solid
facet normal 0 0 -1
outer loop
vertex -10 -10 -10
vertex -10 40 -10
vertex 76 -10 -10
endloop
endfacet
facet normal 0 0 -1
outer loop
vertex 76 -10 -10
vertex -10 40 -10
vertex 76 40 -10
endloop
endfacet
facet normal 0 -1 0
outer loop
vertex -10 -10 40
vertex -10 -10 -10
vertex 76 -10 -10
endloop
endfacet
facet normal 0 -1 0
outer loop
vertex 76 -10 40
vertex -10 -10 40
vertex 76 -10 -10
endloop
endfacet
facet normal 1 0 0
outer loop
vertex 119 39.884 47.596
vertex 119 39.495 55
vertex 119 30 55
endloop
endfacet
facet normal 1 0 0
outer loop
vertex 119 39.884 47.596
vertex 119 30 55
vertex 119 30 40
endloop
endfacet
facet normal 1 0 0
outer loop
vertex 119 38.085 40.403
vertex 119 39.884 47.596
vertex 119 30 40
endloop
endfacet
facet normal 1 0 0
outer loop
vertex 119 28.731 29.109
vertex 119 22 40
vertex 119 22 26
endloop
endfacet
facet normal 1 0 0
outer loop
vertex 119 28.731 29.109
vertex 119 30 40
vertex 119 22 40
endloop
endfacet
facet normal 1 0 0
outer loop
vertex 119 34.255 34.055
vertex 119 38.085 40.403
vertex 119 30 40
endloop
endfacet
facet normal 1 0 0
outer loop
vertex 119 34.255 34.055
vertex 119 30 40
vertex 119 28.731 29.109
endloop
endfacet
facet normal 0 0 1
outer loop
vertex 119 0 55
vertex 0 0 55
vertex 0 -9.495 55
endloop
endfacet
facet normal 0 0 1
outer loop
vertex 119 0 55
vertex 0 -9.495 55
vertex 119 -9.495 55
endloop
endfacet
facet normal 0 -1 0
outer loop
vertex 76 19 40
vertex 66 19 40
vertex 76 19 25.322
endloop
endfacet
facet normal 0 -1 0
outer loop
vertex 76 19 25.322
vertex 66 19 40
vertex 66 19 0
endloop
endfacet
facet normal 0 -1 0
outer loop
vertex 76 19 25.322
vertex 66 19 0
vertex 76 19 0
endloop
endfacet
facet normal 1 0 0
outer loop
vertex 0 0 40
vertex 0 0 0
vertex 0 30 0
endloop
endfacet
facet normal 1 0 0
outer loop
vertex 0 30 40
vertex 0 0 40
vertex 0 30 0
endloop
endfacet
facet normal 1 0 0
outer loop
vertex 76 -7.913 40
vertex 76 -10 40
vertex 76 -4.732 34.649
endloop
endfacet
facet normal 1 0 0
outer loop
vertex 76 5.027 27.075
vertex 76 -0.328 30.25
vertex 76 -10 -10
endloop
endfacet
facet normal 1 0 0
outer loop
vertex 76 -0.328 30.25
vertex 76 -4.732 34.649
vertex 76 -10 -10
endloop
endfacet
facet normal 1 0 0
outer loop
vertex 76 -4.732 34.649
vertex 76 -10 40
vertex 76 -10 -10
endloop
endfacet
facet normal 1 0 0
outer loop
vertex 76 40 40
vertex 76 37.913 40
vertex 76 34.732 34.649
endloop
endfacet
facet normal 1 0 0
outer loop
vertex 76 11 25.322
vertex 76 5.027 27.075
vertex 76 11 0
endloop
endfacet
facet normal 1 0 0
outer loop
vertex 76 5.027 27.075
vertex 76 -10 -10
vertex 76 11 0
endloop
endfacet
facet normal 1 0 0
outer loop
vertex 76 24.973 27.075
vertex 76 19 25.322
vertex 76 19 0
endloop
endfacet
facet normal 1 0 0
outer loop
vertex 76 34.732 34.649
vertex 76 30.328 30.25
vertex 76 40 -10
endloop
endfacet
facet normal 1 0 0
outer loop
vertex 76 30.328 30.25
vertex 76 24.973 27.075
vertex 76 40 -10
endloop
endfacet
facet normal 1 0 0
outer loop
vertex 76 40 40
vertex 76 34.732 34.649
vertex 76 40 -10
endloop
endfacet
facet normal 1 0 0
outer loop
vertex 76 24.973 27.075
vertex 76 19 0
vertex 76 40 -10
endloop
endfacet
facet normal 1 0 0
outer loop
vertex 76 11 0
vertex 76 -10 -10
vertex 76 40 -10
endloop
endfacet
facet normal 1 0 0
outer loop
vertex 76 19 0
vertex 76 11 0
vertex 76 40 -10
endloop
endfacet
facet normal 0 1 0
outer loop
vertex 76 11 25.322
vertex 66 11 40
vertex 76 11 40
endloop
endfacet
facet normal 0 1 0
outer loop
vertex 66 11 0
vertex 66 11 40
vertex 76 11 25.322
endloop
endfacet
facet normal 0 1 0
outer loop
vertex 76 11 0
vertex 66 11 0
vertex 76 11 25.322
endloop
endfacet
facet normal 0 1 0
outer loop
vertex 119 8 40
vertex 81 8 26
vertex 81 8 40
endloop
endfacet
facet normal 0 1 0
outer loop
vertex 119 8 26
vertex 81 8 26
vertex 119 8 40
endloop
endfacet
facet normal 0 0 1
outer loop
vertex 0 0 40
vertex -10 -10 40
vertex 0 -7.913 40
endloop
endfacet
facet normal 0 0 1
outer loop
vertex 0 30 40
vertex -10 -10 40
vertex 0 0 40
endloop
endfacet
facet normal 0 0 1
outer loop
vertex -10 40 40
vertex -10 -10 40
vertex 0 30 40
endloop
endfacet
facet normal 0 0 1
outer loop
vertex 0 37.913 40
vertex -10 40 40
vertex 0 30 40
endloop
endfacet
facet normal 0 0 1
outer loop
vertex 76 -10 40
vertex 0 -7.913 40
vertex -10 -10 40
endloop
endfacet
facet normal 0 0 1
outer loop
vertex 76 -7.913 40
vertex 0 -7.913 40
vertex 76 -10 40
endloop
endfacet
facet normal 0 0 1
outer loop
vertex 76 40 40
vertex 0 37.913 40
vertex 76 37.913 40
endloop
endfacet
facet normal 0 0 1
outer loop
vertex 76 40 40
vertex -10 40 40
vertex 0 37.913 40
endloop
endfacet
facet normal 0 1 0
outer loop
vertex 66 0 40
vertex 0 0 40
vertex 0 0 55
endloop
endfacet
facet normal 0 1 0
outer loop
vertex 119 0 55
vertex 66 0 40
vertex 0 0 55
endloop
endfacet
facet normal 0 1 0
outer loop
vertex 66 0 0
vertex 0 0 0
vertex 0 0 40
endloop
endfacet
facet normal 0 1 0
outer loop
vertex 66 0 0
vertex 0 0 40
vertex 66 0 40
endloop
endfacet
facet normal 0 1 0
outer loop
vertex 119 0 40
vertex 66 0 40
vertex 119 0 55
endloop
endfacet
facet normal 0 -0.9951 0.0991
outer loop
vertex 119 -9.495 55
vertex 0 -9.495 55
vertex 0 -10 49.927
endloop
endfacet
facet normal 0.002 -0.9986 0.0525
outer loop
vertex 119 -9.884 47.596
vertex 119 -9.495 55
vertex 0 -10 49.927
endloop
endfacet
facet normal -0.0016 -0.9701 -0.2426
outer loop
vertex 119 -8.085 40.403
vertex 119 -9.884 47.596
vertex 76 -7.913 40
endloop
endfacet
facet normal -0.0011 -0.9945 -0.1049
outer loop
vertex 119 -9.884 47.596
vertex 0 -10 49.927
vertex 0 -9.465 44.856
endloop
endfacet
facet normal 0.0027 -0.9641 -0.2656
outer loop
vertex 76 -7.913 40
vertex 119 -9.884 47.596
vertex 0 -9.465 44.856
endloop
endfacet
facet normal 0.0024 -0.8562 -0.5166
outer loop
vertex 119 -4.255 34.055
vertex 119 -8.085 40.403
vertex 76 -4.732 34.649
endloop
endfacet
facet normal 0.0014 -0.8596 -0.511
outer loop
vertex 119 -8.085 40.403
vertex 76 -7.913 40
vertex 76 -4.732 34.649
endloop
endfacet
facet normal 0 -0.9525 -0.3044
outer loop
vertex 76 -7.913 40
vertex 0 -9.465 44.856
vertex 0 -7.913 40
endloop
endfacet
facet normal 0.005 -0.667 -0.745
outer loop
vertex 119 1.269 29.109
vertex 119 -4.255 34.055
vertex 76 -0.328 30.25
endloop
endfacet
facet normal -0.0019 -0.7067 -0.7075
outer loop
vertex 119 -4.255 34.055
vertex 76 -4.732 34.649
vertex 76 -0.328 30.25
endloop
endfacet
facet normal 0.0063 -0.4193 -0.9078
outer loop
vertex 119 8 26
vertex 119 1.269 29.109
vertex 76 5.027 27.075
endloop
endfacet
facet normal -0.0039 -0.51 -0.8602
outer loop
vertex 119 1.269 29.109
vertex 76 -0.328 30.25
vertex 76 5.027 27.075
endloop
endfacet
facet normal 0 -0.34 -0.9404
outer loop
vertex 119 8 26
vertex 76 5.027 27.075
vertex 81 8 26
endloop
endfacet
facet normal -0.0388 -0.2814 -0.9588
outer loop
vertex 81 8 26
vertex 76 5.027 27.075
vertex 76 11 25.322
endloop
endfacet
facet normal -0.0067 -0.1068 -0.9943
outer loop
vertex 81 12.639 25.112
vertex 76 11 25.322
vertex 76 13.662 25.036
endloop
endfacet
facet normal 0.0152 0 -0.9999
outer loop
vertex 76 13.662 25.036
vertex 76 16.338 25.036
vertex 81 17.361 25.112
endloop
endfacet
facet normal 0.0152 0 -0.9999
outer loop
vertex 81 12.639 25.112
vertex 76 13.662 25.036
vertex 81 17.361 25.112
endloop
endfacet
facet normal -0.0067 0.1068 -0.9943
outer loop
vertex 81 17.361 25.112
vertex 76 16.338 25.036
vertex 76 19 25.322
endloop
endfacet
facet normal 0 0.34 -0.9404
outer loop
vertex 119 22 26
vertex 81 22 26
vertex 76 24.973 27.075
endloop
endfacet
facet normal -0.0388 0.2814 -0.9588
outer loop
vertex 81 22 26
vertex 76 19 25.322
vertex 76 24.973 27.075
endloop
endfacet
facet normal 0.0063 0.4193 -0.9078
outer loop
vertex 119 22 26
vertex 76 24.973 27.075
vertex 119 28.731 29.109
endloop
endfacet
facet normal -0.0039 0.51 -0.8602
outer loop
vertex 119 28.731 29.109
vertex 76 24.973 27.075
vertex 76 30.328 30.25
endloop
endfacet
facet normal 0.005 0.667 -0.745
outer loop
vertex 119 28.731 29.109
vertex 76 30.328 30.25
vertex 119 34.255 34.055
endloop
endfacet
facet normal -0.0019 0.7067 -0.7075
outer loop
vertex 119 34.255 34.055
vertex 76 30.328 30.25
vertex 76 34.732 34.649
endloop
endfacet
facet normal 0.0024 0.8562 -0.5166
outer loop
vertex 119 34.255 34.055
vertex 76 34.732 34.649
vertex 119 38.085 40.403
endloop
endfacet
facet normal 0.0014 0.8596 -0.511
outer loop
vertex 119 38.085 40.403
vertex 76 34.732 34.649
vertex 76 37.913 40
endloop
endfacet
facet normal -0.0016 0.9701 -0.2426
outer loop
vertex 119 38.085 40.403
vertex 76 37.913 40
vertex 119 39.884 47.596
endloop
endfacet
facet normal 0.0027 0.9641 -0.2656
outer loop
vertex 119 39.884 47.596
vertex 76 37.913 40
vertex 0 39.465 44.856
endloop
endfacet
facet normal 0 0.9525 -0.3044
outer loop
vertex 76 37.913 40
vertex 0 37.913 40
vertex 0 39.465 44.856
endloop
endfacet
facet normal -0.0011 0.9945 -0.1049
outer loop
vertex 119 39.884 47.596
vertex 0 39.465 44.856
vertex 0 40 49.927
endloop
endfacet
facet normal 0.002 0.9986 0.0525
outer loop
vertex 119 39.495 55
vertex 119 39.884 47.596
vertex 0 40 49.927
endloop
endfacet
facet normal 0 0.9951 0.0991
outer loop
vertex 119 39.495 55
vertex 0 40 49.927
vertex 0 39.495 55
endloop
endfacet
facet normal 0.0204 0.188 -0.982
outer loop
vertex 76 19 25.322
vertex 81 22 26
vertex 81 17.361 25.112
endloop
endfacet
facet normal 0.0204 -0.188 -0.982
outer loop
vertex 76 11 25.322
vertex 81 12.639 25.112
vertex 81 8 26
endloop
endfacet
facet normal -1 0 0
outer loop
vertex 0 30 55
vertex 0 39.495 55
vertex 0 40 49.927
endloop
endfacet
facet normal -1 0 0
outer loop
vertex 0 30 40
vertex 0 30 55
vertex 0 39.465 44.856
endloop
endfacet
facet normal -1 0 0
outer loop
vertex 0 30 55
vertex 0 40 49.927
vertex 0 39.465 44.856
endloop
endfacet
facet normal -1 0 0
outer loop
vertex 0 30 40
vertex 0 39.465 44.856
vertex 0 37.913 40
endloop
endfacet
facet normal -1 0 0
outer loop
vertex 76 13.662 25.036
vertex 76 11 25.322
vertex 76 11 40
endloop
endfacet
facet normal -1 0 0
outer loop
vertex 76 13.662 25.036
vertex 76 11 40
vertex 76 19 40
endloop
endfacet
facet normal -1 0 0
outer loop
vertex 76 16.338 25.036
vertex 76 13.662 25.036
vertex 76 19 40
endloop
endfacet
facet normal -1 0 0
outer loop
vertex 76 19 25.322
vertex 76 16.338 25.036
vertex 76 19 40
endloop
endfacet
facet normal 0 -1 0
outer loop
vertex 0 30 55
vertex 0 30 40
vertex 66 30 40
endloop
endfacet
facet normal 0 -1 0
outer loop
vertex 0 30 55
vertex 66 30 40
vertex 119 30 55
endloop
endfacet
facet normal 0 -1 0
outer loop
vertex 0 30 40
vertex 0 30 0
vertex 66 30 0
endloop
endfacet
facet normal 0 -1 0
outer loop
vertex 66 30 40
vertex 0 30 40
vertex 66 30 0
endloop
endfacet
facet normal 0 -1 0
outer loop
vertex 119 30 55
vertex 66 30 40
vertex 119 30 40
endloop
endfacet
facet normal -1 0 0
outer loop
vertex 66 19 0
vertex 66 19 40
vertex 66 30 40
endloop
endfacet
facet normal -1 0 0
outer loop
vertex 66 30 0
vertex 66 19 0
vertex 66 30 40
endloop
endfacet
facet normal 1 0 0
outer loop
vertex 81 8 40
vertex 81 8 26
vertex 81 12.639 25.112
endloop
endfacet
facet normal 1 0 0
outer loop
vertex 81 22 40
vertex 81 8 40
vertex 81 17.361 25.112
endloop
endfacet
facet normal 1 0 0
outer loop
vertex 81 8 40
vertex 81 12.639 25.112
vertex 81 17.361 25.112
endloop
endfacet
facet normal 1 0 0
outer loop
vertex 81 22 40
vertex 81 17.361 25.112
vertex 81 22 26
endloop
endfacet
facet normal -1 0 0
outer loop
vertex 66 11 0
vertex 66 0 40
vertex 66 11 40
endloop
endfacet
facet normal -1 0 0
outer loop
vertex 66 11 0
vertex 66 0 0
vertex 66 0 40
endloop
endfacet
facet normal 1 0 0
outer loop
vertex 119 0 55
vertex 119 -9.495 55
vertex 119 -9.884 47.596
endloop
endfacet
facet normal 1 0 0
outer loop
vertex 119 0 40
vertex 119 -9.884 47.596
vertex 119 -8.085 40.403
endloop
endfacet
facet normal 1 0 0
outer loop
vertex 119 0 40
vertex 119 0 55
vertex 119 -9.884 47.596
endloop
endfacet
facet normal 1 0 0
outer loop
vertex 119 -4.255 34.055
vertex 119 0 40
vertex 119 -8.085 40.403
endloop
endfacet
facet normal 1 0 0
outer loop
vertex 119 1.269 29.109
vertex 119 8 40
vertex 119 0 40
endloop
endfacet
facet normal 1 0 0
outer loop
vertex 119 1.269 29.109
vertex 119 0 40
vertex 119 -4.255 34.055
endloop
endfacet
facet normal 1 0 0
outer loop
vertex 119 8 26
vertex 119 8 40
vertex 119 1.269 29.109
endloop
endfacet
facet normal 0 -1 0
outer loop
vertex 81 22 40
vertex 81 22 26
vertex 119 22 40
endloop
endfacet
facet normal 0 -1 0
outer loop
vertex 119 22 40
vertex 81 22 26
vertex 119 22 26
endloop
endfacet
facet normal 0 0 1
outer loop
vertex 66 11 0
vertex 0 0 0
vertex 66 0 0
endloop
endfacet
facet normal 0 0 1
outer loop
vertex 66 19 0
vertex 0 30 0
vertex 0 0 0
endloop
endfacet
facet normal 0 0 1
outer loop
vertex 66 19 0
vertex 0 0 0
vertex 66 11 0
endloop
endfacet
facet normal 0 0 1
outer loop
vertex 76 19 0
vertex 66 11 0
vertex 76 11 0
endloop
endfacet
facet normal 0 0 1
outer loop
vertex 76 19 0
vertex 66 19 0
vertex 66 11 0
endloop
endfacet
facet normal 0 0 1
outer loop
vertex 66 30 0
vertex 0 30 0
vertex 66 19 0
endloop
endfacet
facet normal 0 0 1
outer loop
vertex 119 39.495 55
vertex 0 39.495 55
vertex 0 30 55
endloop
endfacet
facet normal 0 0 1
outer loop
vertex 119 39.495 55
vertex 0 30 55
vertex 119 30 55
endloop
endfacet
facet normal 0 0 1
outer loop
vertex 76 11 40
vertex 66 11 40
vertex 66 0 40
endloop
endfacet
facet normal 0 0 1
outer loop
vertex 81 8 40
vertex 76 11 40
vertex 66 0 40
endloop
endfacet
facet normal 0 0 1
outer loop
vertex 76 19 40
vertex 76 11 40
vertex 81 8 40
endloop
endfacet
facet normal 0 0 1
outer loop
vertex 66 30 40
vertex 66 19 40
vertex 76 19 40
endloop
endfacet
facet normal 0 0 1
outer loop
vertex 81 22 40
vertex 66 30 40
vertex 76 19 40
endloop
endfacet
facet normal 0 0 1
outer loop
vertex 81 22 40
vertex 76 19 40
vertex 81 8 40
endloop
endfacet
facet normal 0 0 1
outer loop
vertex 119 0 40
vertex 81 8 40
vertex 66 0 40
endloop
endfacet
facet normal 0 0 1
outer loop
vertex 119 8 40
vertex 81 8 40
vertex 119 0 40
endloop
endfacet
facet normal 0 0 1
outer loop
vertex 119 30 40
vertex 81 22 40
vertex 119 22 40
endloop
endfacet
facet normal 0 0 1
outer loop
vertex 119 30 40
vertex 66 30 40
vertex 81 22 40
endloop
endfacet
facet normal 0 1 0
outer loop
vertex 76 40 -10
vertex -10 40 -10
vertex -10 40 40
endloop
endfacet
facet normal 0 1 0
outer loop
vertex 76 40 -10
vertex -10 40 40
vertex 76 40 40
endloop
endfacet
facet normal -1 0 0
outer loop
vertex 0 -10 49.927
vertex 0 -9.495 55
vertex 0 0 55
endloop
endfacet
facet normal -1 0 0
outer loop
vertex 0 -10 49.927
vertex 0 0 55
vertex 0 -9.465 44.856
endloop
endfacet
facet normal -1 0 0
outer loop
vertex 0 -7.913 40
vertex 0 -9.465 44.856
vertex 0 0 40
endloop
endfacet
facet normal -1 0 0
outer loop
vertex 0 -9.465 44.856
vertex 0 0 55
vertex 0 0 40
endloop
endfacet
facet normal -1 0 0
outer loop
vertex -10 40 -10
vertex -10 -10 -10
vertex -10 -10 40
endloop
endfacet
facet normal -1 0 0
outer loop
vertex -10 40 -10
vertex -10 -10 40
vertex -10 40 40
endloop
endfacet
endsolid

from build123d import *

# Parameters (mm, degrees)
BOX051_W          = 10
BOX051_H          = 8
BOX051_DEPTH      = 40
BOX050_W          = 67
BOX050_H          = 14
BOX050_DEPTH      = 25
BOX049_W          = 67
BOX049_H          = 30
BOX049_DEPTH      = 15
BOX048_W          = 119
BOX048_H          = 70
BOX048_DEPTH      = 30
BOX046_W          = 66
BOX046_H          = 30
BOX046_DEPTH      = 60
CYLINDER101_R     = 25
CYLINDER101_DEPTH = 119
BOX047_W          = 86
BOX047_H          = 50
BOX047_DEPTH      = 50


with BuildPart() as cube030:
    # Box051 → Box051 (new body)
    with BuildSketch(Plane(origin=(66, 11, 0), x_dir=(1, 0, 0), z_dir=(0, 0, 1))):
        with Locations((5, 4)):
            Rectangle(BOX051_W, BOX051_H)
    extrude(amount=BOX051_DEPTH)


with BuildPart() as cube029:
    # Box050 → Box050 (new body)
    with BuildSketch(Plane(origin=(81, 8, 15), x_dir=(1, 0, 0), z_dir=(0, 0, 1))):
        with Locations((33.5, 7)):
            Rectangle(BOX050_W, BOX050_H)
    extrude(amount=BOX050_DEPTH)


with BuildPart() as cube028:
    # Box049 → Box049 (new body)
    with BuildSketch(Plane(origin=(66, 0, 40), x_dir=(1, 0, 0), z_dir=(0, 0, 1))):
        with Locations((33.5, 15)):
            Rectangle(BOX049_W, BOX049_H)
    extrude(amount=BOX049_DEPTH)


with BuildPart() as cube027:
    # Box048 → Box048 (new body)
    with BuildSketch(Plane(origin=(0, -13, 55), x_dir=(1, 0, 0), z_dir=(0, 0, 1))):
        with Locations((59.5, 35)):
            Rectangle(BOX048_W, BOX048_H)
    extrude(amount=BOX048_DEPTH)


with BuildPart() as cube025:
    # Box046 → Box046 (new body)
    with BuildSketch(Plane.XY):
        with Locations((33, 15)):
            Rectangle(BOX046_W, BOX046_H)
    extrude(amount=BOX046_DEPTH)


with BuildPart() as cut111:
    # Cylinder101 → Cylinder101 (new body)
    with BuildSketch(Plane(origin=(0, 15, 50), x_dir=(0, 0, -1), z_dir=(1, 0, 0))):
        Circle(CYLINDER101_R)
    extrude(amount=CYLINDER101_DEPTH)

    # Cut108: cut Cube025
    add(cube025.part, mode=Mode.SUBTRACT)

    # Cut109: cut Cube027
    add(cube027.part, mode=Mode.SUBTRACT)

    # Cut110: cut Cube028
    add(cube028.part, mode=Mode.SUBTRACT)

    # Cut111: cut Cube029
    add(cube029.part, mode=Mode.SUBTRACT)


with BuildPart() as cut112:
    # Box047 → Box047 (new body)
    with BuildSketch(Plane(origin=(-10, -10, -10), x_dir=(1, 0, 0), z_dir=(0, 0, 1))):
        with Locations((43, 25)):
            Rectangle(BOX047_W, BOX047_H)
    extrude(amount=BOX047_DEPTH)

    # Cut107: cut Cube025
    add(cube025.part, mode=Mode.SUBTRACT)

    # Fusion031: union Cut111
    add(cut111.part)

    # Cut112: cut Cube030
    add(cube030.part, mode=Mode.SUBTRACT)


solid = cut112.part
